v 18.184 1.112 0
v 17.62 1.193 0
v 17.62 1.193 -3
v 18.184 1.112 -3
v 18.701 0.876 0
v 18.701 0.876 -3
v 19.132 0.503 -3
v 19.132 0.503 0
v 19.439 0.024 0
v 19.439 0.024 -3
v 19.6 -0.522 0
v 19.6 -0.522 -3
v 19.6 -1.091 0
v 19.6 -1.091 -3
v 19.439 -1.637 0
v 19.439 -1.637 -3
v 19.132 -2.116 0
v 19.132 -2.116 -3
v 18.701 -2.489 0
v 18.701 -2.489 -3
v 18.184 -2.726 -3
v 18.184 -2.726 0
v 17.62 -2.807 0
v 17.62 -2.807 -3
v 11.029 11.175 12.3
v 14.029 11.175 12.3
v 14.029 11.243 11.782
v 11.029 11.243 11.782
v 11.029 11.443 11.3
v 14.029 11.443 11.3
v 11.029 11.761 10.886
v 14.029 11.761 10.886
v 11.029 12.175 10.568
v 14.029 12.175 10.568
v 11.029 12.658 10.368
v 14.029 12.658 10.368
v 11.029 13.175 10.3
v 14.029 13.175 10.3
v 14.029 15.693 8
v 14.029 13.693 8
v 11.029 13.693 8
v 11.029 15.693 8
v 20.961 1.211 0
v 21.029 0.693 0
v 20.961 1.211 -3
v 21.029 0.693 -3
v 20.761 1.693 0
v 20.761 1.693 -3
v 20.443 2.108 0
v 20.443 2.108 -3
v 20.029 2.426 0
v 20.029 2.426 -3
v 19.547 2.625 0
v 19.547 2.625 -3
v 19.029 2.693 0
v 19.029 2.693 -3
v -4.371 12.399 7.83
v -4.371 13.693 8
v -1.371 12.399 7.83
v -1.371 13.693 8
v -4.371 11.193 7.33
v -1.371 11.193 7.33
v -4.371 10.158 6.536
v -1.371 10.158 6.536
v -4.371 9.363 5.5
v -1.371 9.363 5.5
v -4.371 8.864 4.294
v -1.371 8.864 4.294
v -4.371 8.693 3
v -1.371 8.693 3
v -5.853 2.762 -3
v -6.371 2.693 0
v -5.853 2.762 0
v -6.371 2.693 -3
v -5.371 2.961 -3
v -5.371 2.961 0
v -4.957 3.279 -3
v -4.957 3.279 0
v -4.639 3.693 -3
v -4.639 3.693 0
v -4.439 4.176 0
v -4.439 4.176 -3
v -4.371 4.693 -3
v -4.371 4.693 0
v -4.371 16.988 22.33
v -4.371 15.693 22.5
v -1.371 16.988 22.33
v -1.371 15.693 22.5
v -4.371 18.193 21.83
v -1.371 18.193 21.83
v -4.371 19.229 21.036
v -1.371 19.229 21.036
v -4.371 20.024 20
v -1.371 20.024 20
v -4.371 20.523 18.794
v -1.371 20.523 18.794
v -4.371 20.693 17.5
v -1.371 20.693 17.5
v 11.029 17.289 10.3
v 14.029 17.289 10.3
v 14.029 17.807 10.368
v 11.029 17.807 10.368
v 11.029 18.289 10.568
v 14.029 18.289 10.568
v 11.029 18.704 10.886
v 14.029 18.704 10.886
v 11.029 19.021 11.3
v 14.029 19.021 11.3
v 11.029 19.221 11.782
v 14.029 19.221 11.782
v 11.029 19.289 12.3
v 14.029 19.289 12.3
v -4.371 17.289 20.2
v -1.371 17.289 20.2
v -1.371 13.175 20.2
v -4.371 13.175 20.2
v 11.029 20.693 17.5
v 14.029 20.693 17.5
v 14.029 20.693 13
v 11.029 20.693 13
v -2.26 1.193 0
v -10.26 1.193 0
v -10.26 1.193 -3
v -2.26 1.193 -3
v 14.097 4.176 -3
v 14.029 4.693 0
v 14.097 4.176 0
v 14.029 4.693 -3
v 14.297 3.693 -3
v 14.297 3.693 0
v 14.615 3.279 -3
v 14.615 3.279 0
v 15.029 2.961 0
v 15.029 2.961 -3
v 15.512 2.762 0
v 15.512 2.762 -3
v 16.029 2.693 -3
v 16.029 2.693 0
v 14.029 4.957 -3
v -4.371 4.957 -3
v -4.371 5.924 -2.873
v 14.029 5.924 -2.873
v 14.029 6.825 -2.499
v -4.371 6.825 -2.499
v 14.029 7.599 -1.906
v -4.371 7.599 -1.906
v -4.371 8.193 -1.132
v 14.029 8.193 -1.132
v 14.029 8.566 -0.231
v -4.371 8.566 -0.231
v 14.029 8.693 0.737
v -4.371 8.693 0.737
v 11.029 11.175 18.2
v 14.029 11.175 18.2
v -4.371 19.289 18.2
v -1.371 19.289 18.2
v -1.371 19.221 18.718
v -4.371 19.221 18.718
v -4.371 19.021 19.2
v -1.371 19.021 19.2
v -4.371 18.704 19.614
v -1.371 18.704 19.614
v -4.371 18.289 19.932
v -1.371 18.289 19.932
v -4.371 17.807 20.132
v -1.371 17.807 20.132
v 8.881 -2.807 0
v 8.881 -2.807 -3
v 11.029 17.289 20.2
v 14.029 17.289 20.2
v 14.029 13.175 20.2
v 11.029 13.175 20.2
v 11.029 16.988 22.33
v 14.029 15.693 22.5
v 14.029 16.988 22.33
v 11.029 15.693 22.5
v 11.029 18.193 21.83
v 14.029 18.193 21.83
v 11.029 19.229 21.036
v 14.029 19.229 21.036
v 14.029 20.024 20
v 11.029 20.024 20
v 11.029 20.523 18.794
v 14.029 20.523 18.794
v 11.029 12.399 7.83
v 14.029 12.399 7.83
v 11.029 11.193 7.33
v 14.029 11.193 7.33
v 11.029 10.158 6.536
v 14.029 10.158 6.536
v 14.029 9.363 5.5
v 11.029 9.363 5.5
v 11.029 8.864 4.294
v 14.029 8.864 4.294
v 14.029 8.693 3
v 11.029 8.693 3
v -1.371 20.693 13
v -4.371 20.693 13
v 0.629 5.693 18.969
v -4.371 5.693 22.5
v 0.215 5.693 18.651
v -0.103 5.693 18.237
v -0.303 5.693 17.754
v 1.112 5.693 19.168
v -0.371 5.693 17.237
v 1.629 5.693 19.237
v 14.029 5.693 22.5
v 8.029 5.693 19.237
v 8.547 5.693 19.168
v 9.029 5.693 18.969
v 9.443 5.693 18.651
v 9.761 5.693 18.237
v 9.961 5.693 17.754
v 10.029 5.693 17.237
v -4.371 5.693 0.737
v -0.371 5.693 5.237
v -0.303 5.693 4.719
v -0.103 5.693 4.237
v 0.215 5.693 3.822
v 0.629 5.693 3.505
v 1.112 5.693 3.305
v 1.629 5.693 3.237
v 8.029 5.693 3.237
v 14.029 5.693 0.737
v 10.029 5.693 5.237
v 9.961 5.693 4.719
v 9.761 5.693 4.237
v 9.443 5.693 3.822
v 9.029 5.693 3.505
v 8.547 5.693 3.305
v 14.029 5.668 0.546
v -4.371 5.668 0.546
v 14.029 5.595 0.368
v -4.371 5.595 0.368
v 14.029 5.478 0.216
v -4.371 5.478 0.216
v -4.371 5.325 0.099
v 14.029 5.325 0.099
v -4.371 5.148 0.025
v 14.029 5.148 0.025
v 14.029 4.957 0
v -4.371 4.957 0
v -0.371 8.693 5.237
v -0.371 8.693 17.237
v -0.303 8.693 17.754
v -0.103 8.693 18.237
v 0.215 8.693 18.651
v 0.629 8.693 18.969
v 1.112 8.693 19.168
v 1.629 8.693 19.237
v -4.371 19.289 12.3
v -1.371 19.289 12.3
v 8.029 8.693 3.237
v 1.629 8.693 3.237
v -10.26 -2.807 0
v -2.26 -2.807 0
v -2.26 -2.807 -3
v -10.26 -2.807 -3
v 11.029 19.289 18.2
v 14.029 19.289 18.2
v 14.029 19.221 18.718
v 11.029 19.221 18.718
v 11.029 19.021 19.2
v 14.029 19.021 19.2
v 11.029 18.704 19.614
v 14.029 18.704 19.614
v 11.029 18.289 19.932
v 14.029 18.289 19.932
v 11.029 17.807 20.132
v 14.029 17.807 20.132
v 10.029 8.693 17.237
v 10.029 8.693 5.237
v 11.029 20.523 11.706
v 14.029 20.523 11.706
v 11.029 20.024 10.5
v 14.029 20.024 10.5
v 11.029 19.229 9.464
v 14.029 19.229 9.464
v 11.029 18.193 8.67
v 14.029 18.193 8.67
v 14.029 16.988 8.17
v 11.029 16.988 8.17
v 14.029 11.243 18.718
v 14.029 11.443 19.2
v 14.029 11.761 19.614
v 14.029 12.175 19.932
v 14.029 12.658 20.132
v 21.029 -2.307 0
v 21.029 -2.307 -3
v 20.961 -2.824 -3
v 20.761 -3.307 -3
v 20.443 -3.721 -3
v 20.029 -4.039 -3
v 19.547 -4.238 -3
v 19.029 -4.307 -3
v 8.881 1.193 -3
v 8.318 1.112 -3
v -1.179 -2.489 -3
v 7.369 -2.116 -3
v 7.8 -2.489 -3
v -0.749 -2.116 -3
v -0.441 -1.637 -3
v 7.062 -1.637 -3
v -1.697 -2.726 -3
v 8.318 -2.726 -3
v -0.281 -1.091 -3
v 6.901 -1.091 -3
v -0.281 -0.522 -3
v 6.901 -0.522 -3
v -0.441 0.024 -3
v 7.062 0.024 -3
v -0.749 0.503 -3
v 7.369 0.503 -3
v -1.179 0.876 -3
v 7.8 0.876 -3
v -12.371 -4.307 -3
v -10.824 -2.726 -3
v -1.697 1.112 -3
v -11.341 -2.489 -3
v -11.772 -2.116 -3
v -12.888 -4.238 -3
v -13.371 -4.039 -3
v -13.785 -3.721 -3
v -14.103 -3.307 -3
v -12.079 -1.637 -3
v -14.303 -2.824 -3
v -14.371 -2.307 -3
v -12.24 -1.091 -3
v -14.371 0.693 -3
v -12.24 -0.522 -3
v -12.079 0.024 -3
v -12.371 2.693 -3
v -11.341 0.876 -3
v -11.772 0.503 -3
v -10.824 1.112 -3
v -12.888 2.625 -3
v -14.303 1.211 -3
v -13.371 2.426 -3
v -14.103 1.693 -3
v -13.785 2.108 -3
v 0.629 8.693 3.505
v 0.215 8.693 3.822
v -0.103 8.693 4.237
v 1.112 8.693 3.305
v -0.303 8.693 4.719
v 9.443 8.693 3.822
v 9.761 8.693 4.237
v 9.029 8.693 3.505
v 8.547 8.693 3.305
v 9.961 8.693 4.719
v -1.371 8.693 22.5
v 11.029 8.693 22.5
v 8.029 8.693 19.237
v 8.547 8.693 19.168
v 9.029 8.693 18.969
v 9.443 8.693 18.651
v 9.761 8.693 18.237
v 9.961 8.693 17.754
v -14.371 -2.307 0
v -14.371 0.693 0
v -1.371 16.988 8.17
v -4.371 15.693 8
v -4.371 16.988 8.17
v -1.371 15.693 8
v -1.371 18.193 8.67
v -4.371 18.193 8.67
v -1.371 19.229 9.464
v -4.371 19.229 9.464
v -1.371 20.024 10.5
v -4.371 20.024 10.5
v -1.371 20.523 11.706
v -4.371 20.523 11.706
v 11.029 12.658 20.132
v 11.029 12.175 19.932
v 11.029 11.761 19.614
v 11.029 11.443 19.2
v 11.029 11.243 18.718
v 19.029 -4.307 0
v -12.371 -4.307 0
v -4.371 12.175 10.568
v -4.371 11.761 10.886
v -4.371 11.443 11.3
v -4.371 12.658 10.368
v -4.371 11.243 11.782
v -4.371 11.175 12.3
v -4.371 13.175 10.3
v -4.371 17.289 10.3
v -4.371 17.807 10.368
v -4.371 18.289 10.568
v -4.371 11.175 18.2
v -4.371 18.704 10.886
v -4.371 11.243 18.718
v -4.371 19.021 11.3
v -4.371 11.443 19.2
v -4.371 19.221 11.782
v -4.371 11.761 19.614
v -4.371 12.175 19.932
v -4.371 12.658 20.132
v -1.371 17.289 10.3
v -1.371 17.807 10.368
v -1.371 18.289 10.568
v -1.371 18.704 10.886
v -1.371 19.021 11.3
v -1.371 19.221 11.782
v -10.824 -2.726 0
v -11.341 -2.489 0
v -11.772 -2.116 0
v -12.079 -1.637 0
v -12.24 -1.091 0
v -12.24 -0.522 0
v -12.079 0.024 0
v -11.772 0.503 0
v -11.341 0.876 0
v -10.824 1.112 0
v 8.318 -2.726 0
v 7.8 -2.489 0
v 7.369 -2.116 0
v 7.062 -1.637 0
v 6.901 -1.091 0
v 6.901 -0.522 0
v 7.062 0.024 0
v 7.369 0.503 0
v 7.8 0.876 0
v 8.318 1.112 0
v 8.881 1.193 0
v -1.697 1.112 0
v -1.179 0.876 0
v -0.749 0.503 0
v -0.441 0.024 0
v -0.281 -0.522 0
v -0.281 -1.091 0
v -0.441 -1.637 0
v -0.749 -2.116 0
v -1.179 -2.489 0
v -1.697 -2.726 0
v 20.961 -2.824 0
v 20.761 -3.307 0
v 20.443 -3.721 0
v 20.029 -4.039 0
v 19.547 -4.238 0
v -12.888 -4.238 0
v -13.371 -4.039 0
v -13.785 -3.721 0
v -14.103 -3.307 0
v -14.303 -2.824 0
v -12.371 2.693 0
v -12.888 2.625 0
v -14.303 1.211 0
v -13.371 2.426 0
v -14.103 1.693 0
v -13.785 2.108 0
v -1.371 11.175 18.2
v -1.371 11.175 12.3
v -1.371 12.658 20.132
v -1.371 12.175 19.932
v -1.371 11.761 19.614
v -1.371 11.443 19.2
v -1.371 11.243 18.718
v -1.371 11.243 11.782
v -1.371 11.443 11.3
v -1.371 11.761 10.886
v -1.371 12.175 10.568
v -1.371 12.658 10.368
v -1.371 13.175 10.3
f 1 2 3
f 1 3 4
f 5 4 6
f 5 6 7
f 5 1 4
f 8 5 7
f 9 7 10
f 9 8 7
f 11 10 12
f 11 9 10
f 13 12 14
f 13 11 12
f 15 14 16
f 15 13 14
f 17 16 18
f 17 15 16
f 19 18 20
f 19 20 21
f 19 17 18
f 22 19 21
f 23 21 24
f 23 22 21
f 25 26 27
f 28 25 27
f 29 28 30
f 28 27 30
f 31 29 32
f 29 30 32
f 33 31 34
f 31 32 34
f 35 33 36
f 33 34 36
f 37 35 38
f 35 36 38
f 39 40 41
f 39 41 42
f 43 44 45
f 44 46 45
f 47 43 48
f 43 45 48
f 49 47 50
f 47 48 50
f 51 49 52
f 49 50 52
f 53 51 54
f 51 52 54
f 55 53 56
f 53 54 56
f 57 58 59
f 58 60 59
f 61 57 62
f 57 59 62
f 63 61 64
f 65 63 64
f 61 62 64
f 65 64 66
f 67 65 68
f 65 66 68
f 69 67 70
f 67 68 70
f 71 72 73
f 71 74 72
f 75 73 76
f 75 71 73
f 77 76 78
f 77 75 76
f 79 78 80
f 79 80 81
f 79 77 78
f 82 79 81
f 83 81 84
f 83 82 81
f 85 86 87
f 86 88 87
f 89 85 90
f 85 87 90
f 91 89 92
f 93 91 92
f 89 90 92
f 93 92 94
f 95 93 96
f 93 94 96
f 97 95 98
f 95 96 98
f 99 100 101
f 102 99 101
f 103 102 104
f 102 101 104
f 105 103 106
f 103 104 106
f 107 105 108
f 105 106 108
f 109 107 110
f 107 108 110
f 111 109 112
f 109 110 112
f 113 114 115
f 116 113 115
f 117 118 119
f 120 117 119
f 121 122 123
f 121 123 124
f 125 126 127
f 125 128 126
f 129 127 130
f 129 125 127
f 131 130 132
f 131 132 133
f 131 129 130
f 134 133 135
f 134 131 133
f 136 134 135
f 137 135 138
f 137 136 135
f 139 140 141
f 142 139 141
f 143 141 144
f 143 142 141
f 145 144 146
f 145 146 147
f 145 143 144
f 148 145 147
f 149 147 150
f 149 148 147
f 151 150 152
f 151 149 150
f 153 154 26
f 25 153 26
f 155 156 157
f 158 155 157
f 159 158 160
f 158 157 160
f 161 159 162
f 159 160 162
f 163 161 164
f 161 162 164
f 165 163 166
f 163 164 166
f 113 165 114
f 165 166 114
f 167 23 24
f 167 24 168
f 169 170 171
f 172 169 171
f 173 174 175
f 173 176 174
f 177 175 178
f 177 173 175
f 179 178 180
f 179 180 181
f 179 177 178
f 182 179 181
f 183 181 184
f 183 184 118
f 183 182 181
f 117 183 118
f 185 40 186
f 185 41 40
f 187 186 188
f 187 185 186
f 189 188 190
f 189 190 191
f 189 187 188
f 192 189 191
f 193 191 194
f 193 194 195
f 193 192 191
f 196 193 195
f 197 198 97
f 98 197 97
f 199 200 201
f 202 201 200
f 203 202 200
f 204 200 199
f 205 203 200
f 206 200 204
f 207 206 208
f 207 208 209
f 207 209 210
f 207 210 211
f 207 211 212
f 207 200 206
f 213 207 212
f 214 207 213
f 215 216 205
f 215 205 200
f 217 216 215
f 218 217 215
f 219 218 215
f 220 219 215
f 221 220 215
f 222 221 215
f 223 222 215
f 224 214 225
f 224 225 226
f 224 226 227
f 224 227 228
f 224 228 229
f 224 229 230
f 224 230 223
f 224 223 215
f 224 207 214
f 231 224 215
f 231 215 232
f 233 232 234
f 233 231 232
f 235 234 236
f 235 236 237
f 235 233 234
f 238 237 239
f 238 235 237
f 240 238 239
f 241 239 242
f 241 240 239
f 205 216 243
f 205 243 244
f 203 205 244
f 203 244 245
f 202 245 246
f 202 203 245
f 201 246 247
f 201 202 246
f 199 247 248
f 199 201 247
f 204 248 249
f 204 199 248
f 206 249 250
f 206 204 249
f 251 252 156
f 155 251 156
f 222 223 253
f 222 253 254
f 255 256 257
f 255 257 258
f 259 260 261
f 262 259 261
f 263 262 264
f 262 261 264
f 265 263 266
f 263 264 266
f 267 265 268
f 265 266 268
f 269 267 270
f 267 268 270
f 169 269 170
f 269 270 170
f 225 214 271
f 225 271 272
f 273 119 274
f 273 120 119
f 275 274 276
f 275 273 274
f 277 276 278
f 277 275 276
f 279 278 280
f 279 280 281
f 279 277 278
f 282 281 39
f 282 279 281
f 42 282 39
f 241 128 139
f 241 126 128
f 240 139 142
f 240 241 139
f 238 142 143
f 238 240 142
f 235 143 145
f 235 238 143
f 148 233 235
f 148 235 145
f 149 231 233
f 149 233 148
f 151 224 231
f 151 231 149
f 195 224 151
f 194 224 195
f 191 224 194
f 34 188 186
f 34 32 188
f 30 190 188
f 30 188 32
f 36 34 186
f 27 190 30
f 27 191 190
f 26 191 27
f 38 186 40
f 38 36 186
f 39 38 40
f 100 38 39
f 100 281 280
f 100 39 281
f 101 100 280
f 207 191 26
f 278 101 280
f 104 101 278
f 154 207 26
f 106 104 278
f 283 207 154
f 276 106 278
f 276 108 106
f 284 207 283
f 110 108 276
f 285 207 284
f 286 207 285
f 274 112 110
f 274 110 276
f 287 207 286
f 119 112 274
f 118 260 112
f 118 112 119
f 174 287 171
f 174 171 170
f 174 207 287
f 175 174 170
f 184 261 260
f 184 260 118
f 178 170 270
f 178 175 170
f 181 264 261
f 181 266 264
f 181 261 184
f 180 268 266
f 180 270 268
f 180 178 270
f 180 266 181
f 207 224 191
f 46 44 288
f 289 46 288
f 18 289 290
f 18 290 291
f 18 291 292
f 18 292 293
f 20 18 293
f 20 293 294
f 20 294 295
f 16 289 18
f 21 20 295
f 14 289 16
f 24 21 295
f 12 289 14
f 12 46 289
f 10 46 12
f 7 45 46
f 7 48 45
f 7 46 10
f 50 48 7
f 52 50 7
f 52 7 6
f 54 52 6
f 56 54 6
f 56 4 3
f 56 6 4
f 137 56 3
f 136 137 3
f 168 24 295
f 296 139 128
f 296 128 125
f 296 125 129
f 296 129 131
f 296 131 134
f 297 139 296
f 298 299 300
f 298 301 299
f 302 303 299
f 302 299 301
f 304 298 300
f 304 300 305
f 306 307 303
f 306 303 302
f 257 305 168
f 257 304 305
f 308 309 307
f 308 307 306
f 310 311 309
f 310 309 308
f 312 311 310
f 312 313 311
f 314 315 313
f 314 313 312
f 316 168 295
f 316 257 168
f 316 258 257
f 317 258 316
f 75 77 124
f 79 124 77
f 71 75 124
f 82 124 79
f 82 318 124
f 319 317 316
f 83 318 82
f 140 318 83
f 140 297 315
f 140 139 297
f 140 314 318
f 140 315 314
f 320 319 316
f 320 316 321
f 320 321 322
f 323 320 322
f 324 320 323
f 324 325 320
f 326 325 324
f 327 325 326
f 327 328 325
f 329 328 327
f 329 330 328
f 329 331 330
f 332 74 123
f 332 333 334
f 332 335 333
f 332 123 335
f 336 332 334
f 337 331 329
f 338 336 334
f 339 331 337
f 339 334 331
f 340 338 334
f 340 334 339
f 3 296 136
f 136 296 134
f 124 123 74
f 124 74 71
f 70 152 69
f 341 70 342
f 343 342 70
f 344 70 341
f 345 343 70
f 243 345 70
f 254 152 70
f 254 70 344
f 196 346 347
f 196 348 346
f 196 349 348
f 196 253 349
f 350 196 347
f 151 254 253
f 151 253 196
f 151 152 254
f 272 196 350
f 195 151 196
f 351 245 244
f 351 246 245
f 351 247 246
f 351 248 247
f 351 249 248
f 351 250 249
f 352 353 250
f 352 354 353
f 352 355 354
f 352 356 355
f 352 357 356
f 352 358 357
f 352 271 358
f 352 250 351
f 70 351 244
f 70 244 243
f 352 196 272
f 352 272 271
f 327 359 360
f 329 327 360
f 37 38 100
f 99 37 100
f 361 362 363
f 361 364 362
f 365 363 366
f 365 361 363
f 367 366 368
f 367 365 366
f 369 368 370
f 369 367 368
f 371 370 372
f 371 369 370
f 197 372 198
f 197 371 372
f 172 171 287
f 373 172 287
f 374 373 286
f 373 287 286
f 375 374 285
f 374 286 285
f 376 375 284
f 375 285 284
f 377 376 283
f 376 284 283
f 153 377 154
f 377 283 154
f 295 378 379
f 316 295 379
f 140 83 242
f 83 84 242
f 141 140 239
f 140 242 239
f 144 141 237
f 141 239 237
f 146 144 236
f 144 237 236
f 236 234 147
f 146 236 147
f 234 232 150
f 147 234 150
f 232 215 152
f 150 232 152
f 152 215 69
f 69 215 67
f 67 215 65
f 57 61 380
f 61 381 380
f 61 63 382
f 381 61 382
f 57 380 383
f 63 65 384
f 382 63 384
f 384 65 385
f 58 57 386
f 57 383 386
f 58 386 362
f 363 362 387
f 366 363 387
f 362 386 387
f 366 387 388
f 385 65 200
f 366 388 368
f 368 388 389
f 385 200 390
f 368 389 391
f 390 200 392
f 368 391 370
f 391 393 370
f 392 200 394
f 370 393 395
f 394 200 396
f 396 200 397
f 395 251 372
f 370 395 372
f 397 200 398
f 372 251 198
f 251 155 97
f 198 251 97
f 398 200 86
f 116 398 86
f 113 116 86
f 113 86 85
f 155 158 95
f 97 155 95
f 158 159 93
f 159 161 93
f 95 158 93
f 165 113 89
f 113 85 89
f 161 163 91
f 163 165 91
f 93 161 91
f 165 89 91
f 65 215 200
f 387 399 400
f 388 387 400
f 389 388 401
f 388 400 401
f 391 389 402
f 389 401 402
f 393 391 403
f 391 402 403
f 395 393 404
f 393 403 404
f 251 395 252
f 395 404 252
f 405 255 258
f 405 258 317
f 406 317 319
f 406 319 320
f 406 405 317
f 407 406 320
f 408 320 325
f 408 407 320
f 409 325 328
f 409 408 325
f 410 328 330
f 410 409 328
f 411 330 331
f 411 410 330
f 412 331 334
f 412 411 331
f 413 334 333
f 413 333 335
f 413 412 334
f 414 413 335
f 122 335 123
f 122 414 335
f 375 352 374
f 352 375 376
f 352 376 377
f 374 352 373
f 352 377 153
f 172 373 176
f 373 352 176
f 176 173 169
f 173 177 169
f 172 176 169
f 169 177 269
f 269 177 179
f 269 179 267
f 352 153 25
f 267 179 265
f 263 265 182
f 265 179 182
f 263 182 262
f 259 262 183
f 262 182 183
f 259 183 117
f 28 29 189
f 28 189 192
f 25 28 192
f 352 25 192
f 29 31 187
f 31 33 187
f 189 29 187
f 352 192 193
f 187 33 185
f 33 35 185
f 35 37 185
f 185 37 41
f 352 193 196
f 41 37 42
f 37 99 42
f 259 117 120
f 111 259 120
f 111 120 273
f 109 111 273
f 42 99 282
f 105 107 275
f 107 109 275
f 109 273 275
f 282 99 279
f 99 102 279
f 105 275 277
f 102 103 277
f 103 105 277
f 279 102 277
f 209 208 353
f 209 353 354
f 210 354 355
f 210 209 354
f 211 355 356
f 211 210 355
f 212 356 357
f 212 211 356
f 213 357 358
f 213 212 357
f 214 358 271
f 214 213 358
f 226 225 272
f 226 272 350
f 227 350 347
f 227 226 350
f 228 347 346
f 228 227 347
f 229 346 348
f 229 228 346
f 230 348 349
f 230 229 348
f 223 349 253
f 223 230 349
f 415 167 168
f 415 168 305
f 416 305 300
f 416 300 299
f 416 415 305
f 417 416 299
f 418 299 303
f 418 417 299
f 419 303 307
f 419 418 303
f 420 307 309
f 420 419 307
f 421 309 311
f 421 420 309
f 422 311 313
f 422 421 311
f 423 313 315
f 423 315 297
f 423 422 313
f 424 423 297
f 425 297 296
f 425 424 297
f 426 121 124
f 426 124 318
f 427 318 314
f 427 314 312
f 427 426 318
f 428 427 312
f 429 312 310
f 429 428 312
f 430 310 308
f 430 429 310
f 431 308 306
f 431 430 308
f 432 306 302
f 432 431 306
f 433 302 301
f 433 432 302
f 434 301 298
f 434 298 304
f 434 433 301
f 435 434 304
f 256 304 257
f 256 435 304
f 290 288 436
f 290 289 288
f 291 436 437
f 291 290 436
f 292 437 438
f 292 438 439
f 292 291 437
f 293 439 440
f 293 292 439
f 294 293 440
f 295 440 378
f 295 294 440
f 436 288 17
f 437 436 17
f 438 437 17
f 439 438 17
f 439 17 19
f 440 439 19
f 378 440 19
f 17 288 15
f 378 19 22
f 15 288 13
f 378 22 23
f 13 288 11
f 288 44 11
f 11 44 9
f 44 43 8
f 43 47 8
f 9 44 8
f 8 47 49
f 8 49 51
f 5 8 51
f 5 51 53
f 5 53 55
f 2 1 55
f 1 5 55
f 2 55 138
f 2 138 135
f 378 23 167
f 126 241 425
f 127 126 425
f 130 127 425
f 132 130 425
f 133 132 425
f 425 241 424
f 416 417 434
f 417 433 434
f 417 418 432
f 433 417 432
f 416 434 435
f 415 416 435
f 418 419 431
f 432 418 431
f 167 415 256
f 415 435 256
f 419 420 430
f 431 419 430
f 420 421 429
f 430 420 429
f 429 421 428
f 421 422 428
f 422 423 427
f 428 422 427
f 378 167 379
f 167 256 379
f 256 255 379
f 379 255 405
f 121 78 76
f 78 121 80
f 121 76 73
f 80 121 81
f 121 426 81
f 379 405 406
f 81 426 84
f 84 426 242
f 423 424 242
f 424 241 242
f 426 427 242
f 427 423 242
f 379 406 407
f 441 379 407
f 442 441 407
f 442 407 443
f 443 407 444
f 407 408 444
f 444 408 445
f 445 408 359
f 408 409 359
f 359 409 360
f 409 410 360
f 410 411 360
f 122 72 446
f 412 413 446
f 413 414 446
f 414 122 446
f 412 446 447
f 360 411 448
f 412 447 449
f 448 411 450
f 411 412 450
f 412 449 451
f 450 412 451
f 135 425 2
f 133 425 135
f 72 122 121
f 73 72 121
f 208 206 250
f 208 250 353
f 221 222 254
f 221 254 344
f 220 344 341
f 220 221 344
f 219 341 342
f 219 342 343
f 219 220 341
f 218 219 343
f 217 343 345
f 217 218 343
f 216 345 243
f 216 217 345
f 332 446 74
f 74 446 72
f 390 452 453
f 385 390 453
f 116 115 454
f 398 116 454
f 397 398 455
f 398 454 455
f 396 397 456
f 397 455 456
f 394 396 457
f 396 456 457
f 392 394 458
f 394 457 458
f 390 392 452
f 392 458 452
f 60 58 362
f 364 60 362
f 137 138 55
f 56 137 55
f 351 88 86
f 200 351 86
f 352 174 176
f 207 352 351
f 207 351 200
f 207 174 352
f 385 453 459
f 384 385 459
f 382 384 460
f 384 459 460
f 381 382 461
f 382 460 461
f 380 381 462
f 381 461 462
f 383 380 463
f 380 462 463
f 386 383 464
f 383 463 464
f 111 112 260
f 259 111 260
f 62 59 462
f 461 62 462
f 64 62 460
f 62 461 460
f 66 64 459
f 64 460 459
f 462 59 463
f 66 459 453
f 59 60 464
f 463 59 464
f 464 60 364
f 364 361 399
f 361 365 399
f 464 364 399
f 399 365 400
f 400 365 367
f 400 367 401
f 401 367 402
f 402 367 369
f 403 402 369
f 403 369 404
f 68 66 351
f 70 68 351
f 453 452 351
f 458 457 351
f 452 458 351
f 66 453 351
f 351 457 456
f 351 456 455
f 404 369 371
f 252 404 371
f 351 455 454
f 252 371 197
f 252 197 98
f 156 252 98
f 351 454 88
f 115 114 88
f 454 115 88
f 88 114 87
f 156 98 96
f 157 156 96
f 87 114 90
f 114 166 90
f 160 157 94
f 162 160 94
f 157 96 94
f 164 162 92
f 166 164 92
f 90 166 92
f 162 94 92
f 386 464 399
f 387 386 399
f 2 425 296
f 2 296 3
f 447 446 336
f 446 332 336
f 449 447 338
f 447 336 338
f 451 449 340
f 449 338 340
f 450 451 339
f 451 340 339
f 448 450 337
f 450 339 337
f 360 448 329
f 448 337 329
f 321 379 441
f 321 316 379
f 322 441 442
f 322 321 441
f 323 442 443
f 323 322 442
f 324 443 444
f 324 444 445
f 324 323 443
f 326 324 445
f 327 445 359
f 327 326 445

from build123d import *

# Parameters (mm, degrees)
FLANGE_BASE1_DEPTH             = 3
CORTE_EXTRUS_O1_DEPTH          = 3
ARESTA_FLANGE4_STRIP_W         = 13.4732
ARESTA_FLANGE4_STRIP_H         = 3
ARESTA_FLANGE4_STRIP_CUT_DEPTH = 18.4
ARESTA_FLANGE4_DEPTH           = 18.4
ESBO_O47_W                     = 14.5
ESBO_O47_H                     = 15
RESSALTO_EXTRUS_O1_DEPTH       = 3
FILETE1_R                      = 5
ESBO_O48_W                     = 14.5
ESBO_O48_H                     = 15
RESSALTO_EXTRUS_O2_DEPTH       = 3
FILETE2_R                      = 5
FILETE3_R                      = 2
CORTE_EXTRUS_O5_DEPTH          = 42.725642599
CORTE_EXTRUS_O6_DEPTH          = 3


# Sheet-metal steps are written as plain solids
with BuildPart() as part:
    # Esboço1 → Flange-base1 (new body)
    with BuildSketch(Plane.XY):
        Polygon((-14.370772566, 2.693459119), (-4.370772566, 2.693459119), (-4.370772566, 5.693459119), (14.029227434, 5.693459119), (14.029227434, 2.693459119), (21.029227434, 2.693459119), (21.029227434, -4.306540881), (-14.370772566, -4.306540881), align=None)
    extrude(amount=-FLANGE_BASE1_DEPTH)

    # Esboço8 → Corte-extrusão1 (cut)
    with BuildSketch(Plane.XY):
        with BuildLine():
            Line((-10.260200759, 1.193459119), (-2.260200759, 1.193459119))
            ThreePointArc((-2.260200759, 1.193459119), (-0.260200759, -0.806540881), (-2.260200759, -2.806540881))
            Line((-2.260200759, -2.806540881), (-10.260200759, -2.806540881))
            ThreePointArc((-10.260200759, -2.806540881), (-12.260200759, -0.806540881), (-10.260200759, 1.193459119))
        make_face()
        with BuildLine():
            Line((8.88097681, 1.193459119), (17.620096532, 1.193459119))
            ThreePointArc((17.620096532, 1.193459119), (19.620096532, -0.806540881), (17.620096532, -2.806540881))
            Line((17.620096532, -2.806540881), (8.88097681, -2.806540881))
            ThreePointArc((8.88097681, -2.806540881), (6.88097681, -0.806540881), (8.88097681, 1.193459119))
        make_face()
    extrude(amount=-CORTE_EXTRUS_O1_DEPTH, mode=Mode.SUBTRACT)

    # Aresta-Flange4 strip (across the edge) → Aresta-Flange4 strip cut (cut)
    with BuildSketch(Plane(origin=(14.029227434, 5.693459119, 0), x_dir=(0, -1, 0), z_dir=(-1, 0, 0))):
        with Locations((-6, -1.5)):
            Rectangle(ARESTA_FLANGE4_STRIP_W, ARESTA_FLANGE4_STRIP_H)
    extrude(amount=ARESTA_FLANGE4_STRIP_CUT_DEPTH, mode=Mode.SUBTRACT)

    # Aresta-Flange4 section (across the edge) → Aresta-Flange4 (add)
    with BuildSketch(Plane(origin=(14.029227434, 5.693459119, 0), x_dir=(0, -1, 0), z_dir=(-1, 0, 0))):
        with BuildLine():
            Line((-3, 0.7366), (-3, 22.5))
            Line((-3, 22.5), (0, 22.5))
            Line((0, 22.5), (0, 0.7366))
            ThreePointArc((0, 0.7366), (0.215745145, 0.215745145), (0.7366, 0))
            Line((0.7366, 0), (0.7366, -3))
            ThreePointArc((0.7366, -3), (-1.905575199, -1.905575199), (-3, 0.7366))
        make_face()
    extrude(amount=ARESTA_FLANGE4_DEPTH)

    # Esboço47 → Ressalto-extrusão1 (add)
    with BuildSketch(Plane(origin=(14.029227434, 0, 0), x_dir=(0, 0, -1), z_dir=(1, 0, 0))):
        with Locations((-15.25, 13.193459119)):
            Rectangle(ESBO_O47_W, ESBO_O47_H)
    extrude(amount=-RESSALTO_EXTRUS_O1_DEPTH)

    # Filete1
    filete1_edges = [part.edges().sort_by_distance(p)[0] for p in [
        (12.529227434, 20.693459119, 22.5),
        (12.529227434, 8.693459119, 8),
        (12.529227434, 20.693459119, 8),
    ]]
    fillet(filete1_edges, radius=FILETE1_R)

    # Esboço48 → Ressalto-extrusão2 (add)
    with BuildSketch(Plane.ZY.offset(4.370772566)):
        with Locations((15.25, 13.193459119)):
            Rectangle(ESBO_O48_W, ESBO_O48_H)
    extrude(amount=-RESSALTO_EXTRUS_O2_DEPTH)

    # Filete2
    filete2_edges = [part.edges().sort_by_distance(p)[0] for p in [
        (-2.870772566, 20.693459119, 22.5),
        (-2.870772566, 8.693459119, 8),
        (-2.870772566, 20.693459119, 8),
    ]]
    fillet(filete2_edges, radius=FILETE2_R)

    # Filete3
    filete3_edges = [part.edges().sort_by_distance(p)[0] for p in [
        (21.029227434, -4.306540881, -1.5),
        (-14.370772566, -4.306540881, -1.5),
        (-14.370772566, 2.693459119, -1.5),
        (-4.370772566, 2.693459119, -1.5),
        (14.029227434, 2.693459119, -1.5),
        (21.029227434, 2.693459119, -1.5),
    ]]
    fillet(filete3_edges, radius=FILETE3_R)

    # Esboço49 → Corte-extrusão5 (cut, through all)
    with BuildSketch(Plane(origin=(14.029227434, 0, 0), x_dir=(0, 0, -1), z_dir=(1, 0, 0))):
        with BuildLine():
            Line((-18.2, 11.175198381), (-12.3, 11.175198381))
            ThreePointArc((-12.3, 11.175198381), (-10.885786438, 11.760984819), (-10.3, 13.175198381))
            Line((-10.3, 13.175198381), (-10.3, 17.289297618))
            ThreePointArc((-10.3, 17.289297618), (-10.885786438, 18.70351118), (-12.3, 19.289297618))
            Line((-12.3, 19.289297618), (-18.2, 19.289297618))
            ThreePointArc((-18.2, 19.289297618), (-19.614213562, 18.70351118), (-20.2, 17.289297618))
            Line((-20.2, 17.289297618), (-20.2, 13.175198381))
            ThreePointArc((-20.2, 13.175198381), (-19.614213562, 11.760984819), (-18.2, 11.175198381))
        make_face()
    extrude(amount=-CORTE_EXTRUS_O5_DEPTH, mode=Mode.SUBTRACT)

    # Esboço50 → Corte-extrusão6 (cut)
    with BuildSketch(Plane.XZ.offset(-5.693459119)):
        with BuildLine():
            Line((1.629227434, 19.2366), (8.029227434, 19.2366))
            ThreePointArc((8.029227434, 19.2366), (9.443440996, 18.650813562), (10.029227434, 17.2366))
            Line((10.029227434, 17.2366), (10.029227434, 5.2366))
            ThreePointArc((10.029227434, 5.2366), (9.443440996, 3.822386438), (8.029227434, 3.2366))
            Line((8.029227434, 3.2366), (1.629227434, 3.2366))
            ThreePointArc((1.629227434, 3.2366), (0.215013871, 3.822386438), (-0.370772566, 5.2366))
            Line((-0.370772566, 5.2366), (-0.370772566, 17.2366))
            ThreePointArc((-0.370772566, 17.2366), (0.215013871, 18.650813562), (1.629227434, 19.2366))
        make_face()
    extrude(amount=-CORTE_EXTRUS_O6_DEPTH, mode=Mode.SUBTRACT)


solid = part.part
